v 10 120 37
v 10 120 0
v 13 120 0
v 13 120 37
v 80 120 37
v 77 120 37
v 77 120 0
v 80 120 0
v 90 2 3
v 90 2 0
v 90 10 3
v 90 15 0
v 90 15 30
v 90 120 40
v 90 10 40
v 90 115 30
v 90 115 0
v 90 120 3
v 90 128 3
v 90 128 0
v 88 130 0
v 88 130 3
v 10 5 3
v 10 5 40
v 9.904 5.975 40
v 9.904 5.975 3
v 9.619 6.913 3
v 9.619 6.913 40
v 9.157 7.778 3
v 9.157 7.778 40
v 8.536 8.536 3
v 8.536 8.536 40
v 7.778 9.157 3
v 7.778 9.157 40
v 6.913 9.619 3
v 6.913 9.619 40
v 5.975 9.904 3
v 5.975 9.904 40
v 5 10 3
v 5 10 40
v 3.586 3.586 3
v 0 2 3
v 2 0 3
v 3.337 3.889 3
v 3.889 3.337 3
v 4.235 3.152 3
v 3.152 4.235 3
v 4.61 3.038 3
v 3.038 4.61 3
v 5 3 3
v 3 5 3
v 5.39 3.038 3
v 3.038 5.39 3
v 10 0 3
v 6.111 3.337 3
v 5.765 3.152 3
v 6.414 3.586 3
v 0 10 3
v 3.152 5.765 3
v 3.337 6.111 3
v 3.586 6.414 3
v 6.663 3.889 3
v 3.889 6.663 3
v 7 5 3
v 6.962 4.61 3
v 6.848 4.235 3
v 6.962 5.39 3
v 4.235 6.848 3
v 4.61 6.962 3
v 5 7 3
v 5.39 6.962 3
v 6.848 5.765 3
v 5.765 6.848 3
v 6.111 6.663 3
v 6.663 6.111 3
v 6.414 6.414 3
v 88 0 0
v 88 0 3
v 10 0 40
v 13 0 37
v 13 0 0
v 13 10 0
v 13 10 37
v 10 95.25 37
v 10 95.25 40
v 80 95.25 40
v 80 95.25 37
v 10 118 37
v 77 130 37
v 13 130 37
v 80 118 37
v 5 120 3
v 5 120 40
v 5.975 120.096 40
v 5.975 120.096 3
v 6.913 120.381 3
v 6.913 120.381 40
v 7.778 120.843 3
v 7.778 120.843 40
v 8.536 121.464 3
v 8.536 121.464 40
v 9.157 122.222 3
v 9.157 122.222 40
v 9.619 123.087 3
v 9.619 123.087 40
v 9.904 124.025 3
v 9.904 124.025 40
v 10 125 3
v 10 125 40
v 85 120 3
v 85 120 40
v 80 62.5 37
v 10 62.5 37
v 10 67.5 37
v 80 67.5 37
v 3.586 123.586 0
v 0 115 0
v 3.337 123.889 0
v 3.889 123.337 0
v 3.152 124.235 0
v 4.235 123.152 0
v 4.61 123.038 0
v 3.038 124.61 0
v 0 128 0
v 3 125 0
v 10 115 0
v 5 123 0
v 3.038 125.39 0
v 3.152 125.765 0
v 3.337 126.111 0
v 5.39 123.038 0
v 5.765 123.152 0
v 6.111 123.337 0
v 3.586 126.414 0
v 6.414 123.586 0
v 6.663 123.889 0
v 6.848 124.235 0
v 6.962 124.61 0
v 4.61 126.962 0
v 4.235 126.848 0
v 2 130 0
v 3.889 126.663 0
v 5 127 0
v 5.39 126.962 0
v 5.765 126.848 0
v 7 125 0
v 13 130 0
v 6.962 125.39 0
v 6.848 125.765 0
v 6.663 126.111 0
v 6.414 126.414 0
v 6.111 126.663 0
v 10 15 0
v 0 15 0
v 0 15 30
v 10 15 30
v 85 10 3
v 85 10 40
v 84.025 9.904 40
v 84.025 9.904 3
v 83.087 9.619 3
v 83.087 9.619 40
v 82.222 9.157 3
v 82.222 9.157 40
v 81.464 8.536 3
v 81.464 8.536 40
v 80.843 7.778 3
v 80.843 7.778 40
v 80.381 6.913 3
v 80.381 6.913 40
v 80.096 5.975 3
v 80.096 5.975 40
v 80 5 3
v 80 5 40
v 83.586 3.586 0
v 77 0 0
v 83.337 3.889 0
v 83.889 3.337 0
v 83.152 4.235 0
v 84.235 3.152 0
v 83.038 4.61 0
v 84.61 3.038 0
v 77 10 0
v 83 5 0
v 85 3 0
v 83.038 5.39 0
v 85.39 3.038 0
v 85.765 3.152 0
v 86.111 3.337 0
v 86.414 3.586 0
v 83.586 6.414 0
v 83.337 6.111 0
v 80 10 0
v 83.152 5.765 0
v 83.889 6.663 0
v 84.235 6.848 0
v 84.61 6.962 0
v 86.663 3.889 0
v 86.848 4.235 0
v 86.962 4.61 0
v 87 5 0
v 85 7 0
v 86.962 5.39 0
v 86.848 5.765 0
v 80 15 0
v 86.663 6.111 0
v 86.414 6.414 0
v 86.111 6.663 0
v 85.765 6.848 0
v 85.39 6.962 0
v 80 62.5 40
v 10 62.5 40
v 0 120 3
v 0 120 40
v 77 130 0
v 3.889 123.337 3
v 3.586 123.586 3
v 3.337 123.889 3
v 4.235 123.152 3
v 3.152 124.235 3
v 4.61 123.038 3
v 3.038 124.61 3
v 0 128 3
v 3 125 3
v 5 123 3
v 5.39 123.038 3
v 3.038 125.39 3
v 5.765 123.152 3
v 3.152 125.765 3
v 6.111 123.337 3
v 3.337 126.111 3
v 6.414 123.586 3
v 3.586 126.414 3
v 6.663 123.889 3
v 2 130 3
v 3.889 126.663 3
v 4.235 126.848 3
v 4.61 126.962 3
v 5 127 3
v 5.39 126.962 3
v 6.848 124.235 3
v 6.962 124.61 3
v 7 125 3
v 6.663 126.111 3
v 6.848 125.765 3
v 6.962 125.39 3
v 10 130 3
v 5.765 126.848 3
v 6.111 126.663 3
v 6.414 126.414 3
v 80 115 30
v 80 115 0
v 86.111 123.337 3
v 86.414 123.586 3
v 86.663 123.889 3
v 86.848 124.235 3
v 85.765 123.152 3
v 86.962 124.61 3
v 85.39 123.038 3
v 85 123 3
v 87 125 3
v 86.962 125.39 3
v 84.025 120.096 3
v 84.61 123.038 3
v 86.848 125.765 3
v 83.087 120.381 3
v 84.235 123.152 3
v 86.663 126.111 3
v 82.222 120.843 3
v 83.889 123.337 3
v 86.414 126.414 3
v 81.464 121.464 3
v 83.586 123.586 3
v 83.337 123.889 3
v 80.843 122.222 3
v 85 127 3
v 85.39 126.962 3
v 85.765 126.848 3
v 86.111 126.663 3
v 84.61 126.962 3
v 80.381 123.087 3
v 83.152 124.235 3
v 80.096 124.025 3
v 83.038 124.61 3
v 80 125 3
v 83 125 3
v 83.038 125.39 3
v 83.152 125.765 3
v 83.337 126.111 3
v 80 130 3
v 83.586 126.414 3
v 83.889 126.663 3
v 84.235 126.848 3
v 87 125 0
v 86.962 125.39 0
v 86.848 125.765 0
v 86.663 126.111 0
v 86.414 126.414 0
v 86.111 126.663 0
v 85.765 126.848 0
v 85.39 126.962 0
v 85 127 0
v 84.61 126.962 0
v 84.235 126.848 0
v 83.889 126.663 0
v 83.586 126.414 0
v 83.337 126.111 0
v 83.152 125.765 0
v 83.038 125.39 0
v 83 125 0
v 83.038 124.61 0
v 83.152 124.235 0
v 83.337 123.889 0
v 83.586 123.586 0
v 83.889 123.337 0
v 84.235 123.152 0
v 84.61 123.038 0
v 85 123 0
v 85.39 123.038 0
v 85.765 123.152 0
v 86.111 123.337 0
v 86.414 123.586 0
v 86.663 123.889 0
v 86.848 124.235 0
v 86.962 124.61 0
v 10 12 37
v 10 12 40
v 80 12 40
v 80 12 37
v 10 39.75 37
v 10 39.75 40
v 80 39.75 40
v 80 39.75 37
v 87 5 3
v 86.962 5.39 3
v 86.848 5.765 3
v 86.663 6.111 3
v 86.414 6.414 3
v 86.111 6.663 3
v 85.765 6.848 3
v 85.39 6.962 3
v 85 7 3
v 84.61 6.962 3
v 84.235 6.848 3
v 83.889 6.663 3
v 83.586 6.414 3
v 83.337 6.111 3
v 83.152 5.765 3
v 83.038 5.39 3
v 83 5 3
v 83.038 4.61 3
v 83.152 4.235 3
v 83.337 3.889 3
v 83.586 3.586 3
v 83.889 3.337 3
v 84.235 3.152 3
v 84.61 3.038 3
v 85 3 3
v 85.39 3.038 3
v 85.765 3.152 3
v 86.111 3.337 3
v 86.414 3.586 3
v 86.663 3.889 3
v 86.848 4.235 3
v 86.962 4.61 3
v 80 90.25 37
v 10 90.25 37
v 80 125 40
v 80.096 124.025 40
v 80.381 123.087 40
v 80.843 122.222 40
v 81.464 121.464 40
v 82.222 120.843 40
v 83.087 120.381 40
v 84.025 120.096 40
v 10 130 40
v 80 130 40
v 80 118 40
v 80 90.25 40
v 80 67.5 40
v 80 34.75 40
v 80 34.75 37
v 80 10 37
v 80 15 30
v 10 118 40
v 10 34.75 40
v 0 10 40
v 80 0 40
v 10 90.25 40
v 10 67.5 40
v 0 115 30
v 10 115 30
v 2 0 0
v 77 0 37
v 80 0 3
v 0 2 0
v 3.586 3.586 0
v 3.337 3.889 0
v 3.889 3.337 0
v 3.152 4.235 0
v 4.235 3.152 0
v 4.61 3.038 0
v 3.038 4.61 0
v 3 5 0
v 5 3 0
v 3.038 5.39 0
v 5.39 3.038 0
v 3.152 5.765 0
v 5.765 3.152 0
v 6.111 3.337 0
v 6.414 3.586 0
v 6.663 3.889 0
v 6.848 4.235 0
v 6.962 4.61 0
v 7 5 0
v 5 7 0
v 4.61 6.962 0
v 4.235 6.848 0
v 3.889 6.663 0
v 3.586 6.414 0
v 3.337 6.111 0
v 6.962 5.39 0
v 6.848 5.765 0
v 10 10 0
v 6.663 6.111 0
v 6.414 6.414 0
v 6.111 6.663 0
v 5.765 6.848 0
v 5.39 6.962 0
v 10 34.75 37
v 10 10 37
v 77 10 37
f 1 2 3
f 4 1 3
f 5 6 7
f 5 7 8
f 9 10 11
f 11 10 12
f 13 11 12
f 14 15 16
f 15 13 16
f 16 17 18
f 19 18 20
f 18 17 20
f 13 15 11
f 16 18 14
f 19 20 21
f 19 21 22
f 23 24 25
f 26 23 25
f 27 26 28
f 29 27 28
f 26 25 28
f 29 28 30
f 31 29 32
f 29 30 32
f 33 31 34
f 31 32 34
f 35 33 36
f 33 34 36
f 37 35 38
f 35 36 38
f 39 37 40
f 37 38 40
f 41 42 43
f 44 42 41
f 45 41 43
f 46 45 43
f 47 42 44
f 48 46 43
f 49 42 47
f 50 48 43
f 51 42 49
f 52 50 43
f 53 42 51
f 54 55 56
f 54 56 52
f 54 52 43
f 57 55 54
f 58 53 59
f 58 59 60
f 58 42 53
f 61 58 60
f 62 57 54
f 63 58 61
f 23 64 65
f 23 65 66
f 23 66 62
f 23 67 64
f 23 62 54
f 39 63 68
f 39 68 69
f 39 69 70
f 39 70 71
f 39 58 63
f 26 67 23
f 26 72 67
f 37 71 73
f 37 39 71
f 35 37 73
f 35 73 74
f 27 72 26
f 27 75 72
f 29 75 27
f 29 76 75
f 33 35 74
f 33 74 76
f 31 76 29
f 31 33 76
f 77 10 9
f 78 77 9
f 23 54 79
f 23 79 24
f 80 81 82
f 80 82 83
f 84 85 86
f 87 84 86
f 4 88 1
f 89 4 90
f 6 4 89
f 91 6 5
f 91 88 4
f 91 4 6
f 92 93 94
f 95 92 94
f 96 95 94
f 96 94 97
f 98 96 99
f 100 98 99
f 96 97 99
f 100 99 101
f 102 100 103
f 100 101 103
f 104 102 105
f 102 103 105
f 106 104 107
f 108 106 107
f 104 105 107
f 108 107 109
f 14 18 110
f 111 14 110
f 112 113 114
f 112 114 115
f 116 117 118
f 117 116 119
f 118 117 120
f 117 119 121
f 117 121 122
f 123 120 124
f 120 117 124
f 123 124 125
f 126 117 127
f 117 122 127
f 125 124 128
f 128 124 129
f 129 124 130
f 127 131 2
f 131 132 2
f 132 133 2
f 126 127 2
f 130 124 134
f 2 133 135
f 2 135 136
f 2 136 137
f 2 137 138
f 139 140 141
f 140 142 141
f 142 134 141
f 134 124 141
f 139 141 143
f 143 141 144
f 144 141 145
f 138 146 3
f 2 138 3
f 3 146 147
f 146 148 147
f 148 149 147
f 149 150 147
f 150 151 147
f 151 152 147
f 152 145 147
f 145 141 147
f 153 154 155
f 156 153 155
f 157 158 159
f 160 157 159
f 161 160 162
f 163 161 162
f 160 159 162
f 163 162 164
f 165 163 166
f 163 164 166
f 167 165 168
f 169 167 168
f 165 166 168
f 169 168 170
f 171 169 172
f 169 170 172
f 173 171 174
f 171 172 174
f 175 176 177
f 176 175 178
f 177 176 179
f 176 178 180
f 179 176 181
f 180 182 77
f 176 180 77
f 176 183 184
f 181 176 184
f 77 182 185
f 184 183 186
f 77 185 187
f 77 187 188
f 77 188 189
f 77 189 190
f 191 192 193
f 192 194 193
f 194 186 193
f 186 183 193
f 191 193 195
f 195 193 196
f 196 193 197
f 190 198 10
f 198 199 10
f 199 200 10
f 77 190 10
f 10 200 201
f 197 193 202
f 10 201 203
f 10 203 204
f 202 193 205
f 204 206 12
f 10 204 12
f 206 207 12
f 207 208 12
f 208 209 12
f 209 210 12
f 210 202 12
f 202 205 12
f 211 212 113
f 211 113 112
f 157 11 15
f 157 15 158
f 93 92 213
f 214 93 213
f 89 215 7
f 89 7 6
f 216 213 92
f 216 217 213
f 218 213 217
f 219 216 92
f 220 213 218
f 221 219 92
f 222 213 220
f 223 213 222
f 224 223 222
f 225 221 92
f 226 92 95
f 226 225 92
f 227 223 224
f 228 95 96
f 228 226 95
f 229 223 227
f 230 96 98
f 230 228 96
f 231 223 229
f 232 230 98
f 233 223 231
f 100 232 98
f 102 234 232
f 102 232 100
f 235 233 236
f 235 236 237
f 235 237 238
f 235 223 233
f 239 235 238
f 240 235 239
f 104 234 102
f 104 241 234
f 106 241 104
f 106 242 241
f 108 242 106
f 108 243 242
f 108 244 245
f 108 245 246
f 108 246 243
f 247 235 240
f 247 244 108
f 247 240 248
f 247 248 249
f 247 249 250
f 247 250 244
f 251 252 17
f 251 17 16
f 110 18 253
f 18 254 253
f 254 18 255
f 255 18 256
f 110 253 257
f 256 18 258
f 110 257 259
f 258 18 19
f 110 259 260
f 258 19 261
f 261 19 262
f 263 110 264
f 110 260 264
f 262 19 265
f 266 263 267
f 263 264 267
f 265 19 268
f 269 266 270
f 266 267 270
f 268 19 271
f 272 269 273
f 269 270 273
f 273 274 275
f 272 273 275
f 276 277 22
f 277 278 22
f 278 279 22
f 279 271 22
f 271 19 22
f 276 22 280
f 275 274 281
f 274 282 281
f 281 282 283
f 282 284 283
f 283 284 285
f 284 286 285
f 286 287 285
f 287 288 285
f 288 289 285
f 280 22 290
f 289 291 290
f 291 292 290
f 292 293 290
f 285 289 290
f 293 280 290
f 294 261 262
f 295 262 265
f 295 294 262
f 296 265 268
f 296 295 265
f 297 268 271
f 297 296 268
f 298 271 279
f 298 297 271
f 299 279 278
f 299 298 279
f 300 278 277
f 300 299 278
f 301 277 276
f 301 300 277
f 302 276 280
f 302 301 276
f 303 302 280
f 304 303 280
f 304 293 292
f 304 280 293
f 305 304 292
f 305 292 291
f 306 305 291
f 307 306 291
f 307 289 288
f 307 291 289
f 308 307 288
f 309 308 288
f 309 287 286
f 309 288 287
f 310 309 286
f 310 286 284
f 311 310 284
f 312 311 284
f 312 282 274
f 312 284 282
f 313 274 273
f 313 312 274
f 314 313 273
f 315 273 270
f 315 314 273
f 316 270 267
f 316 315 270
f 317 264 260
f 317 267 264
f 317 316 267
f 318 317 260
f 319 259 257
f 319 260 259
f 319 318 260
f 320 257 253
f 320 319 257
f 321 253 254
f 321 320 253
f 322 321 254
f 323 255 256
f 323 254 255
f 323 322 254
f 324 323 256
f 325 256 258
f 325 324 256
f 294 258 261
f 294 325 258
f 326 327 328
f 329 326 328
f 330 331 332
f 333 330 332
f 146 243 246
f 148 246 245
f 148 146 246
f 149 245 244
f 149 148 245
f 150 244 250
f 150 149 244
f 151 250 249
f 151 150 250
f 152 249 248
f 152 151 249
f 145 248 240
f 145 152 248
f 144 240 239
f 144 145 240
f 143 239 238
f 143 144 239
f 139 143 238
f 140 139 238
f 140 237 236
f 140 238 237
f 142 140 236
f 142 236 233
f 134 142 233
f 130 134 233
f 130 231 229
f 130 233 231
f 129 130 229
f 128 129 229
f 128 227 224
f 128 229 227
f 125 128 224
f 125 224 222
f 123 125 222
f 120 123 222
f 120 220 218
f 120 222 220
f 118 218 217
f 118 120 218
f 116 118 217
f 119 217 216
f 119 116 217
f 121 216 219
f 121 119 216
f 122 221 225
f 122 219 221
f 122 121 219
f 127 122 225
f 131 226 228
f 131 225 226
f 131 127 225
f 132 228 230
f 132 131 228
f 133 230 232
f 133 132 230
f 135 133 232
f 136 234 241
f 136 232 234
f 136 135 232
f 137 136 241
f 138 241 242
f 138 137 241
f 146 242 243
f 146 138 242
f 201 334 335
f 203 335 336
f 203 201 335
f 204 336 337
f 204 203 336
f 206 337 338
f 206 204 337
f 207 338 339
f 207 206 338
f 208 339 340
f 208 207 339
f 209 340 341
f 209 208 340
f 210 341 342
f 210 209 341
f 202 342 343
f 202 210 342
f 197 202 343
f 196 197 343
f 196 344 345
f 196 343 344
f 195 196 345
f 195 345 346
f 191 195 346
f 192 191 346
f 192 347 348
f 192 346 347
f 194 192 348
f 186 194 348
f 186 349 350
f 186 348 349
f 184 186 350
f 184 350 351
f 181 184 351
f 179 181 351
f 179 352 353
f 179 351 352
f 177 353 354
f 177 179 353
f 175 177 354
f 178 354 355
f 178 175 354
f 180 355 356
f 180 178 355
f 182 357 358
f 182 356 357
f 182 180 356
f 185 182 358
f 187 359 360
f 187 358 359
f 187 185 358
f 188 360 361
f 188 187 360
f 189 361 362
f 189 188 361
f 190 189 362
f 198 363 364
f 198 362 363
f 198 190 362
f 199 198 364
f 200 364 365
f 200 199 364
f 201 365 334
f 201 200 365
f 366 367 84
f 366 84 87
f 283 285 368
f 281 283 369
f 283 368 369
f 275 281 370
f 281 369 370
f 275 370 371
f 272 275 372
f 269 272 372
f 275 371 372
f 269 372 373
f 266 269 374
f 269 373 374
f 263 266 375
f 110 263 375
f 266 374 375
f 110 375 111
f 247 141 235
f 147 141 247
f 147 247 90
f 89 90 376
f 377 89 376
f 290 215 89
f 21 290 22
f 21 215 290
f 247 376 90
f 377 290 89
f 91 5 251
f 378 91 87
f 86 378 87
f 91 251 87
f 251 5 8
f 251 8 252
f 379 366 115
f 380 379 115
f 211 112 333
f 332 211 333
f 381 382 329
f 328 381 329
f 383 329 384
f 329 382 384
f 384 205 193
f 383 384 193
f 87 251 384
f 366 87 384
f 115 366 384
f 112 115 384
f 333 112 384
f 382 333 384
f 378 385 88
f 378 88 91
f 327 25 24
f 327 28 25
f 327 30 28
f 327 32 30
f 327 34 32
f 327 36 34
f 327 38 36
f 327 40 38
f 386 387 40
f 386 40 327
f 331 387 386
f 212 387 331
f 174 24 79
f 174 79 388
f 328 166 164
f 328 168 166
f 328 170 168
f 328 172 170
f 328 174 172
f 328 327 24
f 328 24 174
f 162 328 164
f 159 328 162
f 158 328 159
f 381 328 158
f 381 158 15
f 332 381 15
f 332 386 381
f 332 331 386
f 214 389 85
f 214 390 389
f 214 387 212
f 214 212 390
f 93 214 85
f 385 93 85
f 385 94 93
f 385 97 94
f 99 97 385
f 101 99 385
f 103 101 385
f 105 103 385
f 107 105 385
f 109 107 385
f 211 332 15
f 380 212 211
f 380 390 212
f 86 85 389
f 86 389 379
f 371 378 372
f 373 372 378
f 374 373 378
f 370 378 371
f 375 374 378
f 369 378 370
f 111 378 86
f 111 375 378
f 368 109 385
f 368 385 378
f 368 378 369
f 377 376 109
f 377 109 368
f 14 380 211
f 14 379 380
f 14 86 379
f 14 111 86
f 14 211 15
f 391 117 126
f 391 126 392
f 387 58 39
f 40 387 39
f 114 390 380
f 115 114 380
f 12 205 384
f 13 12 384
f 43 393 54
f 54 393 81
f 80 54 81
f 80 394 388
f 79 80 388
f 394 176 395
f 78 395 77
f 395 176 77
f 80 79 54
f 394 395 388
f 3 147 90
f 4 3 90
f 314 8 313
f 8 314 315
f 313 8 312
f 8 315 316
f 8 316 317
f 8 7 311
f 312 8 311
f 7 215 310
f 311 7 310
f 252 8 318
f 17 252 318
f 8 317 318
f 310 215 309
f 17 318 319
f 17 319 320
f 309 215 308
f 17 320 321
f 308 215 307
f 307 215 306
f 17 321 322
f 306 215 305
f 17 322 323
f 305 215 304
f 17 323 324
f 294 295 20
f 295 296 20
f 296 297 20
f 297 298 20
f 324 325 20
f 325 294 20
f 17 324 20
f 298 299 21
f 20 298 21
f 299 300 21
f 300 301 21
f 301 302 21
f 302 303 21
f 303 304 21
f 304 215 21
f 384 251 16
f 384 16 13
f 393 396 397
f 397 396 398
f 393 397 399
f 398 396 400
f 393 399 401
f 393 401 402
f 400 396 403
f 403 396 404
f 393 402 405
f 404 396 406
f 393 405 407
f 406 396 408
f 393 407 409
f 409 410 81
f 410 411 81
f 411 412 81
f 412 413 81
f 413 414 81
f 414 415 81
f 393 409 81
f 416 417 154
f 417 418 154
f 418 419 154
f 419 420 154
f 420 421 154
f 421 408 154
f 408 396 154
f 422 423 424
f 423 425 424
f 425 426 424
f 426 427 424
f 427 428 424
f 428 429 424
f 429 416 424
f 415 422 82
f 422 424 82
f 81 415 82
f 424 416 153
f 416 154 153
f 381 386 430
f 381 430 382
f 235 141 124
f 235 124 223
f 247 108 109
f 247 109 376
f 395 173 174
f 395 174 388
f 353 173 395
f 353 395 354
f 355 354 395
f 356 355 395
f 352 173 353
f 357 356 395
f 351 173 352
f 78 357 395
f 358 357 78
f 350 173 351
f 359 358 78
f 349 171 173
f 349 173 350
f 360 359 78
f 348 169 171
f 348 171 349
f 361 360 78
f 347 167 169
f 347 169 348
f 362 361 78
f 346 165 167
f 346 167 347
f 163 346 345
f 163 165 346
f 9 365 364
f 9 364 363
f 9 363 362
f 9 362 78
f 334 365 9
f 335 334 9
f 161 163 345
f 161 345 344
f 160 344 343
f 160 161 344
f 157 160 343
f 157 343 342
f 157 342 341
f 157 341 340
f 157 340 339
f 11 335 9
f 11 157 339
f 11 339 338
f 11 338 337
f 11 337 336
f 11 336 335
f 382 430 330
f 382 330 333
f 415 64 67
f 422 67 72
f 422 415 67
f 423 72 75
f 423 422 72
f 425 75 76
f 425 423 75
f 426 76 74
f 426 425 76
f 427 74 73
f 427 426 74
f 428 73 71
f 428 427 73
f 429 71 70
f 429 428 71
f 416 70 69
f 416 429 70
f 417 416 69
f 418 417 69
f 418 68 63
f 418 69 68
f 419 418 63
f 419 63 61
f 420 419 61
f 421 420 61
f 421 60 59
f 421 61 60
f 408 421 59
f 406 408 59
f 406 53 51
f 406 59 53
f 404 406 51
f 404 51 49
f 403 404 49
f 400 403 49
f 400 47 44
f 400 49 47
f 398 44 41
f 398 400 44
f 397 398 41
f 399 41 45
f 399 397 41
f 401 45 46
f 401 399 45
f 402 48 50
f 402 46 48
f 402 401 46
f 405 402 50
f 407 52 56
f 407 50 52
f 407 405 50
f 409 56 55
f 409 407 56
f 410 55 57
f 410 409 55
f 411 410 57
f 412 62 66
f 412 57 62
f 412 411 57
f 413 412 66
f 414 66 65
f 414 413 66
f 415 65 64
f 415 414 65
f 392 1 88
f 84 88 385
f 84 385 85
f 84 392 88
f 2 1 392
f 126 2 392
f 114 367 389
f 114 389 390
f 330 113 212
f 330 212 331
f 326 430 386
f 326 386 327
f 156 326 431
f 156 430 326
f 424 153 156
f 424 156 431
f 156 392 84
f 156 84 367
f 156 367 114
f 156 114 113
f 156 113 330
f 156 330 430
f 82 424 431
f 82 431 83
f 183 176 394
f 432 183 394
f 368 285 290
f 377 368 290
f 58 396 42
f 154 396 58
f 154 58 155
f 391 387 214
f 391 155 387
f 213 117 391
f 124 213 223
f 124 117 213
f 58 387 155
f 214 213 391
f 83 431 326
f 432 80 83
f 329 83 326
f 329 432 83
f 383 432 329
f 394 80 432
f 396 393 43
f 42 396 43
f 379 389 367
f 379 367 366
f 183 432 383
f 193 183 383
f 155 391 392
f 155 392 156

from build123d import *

# Parameters (mm, degrees)
SKETCH_W        = 90
SKETCH_H        = 130
SKETCH_R        = 2
PAD_DEPTH       = 40
POCKET_DEPTH    = 37
SKETCH002_W     = 70
SKETCH002_H     = 110
POCKET001_DEPTH = 37
SKETCH003_W     = 64
SKETCH003_H     = 37
POCKET002_DEPTH = 10
SKETCH004_W     = 70
SKETCH004_H     = 22.75
POCKET003_DEPTH = 3
CHAMFER_SIZE    = 2
SKETCH005_W     = 100
SKETCH005_H     = 30
POCKET004_DEPTH = 90.001
SKETCH006_W     = 64
SKETCH006_H     = 37
POCKET005_DEPTH = 10


with BuildPart() as part:
    # Sketch → Pad (new body)
    with BuildSketch(Plane.XY):
        with Locations((45, 65)):
            Rectangle(SKETCH_W, SKETCH_H)
        with Locations((5, 125)):
            Circle(SKETCH_R, mode=Mode.SUBTRACT)
        with Locations((85, 125)):
            Circle(SKETCH_R, mode=Mode.SUBTRACT)
        with Locations((85, 5)):
            Circle(SKETCH_R, mode=Mode.SUBTRACT)
        with Locations((5, 5)):
            Circle(SKETCH_R, mode=Mode.SUBTRACT)
    extrude(amount=PAD_DEPTH)

    # Sketch001 (on Face10 of Pad) → Pocket (cut)
    with BuildSketch(Plane.XY.offset(40)):
        with BuildLine():
            ThreePointArc((5, 120), (8.535534, 121.464466), (10, 125))
            Line((10, 125), (10, 130))
            Line((10, 130), (0, 130))
            Line((0, 130), (0, 120))
            Line((5, 120), (0, 120))
        make_face()
        with BuildLine():
            Line((80, 125), (80, 130))
            Line((80, 130), (90, 130))
            Line((90, 130), (90, 120))
            Line((90, 120), (85, 120))
            ThreePointArc((80, 125), (81.464466, 121.464466), (85, 120))
        make_face()
        with BuildLine():
            Line((80, 5), (80, 0))
            Line((80, 0), (90, 0))
            Line((90, 0), (90, 10))
            Line((90, 10), (85, 10))
            ThreePointArc((85, 10), (81.464466, 8.535534), (80, 5))
        make_face()
        with BuildLine():
            Line((0, 10), (0, 0))
            Line((0, 0), (10, 0))
            Line((10, 0), (10, 5))
            ThreePointArc((10, 5), (8.535534, 8.535534), (5, 10))
            Line((0, 10), (5, 10))
        make_face()
    extrude(amount=-POCKET_DEPTH, mode=Mode.SUBTRACT)

    # Sketch002 (on Face2 of Pocket) → Pocket001 (cut)
    with BuildSketch(Plane(origin=(0, 0, 0), x_dir=(1, 0, 0), z_dir=(0, 0, -1))):
        with Locations((45, -65)):
            Rectangle(SKETCH002_W, SKETCH002_H)
    extrude(amount=-POCKET001_DEPTH, mode=Mode.SUBTRACT)

    # Sketch003 (on Face1 of Pocket001) → Pocket002 (cut)
    with BuildSketch(Plane.XZ):
        with Locations((45, 18.5)):
            Rectangle(SKETCH003_W, SKETCH003_H)
    extrude(amount=-POCKET002_DEPTH, mode=Mode.SUBTRACT)

    # Sketch004 (on Face9 of Pocket002) → Pocket003 (cut)
    with BuildSketch(Plane.XY.offset(40)):
        with Locations((45, 106.625)):
            Rectangle(SKETCH004_W, SKETCH004_H)
        with Locations((45, 78.875)):
            Rectangle(SKETCH004_W, SKETCH004_H)
        with Locations((45, 23.375)):
            Rectangle(SKETCH004_W, SKETCH004_H)
        with Locations((45, 51.125)):
            Rectangle(SKETCH004_W, SKETCH004_H)
    extrude(amount=-POCKET003_DEPTH, mode=Mode.SUBTRACT)

    # Chamfer
    chamfer_edges = [part.edges().sort_by_distance(p)[0] for p in [
        (90, 0, 1.5),
        (90, 130, 1.5),
        (0, 0, 1.5),
        (0, 130, 1.5),
    ]]
    chamfer(chamfer_edges, length=CHAMFER_SIZE)

    # Sketch005 (on Face13 of Chamfer) → Pocket004 (cut, through all)
    with BuildSketch(Plane(origin=(0, 0, 0), x_dir=(0, -1, 0), z_dir=(-1, 0, 0))):
        with Locations((-65, 15)):
            Rectangle(SKETCH005_W, SKETCH005_H)
    extrude(amount=-POCKET004_DEPTH, mode=Mode.SUBTRACT)

    # Sketch006 (on Face31 of Pocket004) → Pocket005 (cut)
    with BuildSketch(Plane(origin=(0, 130, 0), x_dir=(-1, 0, 0), z_dir=(0, 1, 0))):
        with Locations((-45, 18.5)):
            Rectangle(SKETCH006_W, SKETCH006_H)
    extrude(amount=-POCKET005_DEPTH, mode=Mode.SUBTRACT)


solid = part.part
